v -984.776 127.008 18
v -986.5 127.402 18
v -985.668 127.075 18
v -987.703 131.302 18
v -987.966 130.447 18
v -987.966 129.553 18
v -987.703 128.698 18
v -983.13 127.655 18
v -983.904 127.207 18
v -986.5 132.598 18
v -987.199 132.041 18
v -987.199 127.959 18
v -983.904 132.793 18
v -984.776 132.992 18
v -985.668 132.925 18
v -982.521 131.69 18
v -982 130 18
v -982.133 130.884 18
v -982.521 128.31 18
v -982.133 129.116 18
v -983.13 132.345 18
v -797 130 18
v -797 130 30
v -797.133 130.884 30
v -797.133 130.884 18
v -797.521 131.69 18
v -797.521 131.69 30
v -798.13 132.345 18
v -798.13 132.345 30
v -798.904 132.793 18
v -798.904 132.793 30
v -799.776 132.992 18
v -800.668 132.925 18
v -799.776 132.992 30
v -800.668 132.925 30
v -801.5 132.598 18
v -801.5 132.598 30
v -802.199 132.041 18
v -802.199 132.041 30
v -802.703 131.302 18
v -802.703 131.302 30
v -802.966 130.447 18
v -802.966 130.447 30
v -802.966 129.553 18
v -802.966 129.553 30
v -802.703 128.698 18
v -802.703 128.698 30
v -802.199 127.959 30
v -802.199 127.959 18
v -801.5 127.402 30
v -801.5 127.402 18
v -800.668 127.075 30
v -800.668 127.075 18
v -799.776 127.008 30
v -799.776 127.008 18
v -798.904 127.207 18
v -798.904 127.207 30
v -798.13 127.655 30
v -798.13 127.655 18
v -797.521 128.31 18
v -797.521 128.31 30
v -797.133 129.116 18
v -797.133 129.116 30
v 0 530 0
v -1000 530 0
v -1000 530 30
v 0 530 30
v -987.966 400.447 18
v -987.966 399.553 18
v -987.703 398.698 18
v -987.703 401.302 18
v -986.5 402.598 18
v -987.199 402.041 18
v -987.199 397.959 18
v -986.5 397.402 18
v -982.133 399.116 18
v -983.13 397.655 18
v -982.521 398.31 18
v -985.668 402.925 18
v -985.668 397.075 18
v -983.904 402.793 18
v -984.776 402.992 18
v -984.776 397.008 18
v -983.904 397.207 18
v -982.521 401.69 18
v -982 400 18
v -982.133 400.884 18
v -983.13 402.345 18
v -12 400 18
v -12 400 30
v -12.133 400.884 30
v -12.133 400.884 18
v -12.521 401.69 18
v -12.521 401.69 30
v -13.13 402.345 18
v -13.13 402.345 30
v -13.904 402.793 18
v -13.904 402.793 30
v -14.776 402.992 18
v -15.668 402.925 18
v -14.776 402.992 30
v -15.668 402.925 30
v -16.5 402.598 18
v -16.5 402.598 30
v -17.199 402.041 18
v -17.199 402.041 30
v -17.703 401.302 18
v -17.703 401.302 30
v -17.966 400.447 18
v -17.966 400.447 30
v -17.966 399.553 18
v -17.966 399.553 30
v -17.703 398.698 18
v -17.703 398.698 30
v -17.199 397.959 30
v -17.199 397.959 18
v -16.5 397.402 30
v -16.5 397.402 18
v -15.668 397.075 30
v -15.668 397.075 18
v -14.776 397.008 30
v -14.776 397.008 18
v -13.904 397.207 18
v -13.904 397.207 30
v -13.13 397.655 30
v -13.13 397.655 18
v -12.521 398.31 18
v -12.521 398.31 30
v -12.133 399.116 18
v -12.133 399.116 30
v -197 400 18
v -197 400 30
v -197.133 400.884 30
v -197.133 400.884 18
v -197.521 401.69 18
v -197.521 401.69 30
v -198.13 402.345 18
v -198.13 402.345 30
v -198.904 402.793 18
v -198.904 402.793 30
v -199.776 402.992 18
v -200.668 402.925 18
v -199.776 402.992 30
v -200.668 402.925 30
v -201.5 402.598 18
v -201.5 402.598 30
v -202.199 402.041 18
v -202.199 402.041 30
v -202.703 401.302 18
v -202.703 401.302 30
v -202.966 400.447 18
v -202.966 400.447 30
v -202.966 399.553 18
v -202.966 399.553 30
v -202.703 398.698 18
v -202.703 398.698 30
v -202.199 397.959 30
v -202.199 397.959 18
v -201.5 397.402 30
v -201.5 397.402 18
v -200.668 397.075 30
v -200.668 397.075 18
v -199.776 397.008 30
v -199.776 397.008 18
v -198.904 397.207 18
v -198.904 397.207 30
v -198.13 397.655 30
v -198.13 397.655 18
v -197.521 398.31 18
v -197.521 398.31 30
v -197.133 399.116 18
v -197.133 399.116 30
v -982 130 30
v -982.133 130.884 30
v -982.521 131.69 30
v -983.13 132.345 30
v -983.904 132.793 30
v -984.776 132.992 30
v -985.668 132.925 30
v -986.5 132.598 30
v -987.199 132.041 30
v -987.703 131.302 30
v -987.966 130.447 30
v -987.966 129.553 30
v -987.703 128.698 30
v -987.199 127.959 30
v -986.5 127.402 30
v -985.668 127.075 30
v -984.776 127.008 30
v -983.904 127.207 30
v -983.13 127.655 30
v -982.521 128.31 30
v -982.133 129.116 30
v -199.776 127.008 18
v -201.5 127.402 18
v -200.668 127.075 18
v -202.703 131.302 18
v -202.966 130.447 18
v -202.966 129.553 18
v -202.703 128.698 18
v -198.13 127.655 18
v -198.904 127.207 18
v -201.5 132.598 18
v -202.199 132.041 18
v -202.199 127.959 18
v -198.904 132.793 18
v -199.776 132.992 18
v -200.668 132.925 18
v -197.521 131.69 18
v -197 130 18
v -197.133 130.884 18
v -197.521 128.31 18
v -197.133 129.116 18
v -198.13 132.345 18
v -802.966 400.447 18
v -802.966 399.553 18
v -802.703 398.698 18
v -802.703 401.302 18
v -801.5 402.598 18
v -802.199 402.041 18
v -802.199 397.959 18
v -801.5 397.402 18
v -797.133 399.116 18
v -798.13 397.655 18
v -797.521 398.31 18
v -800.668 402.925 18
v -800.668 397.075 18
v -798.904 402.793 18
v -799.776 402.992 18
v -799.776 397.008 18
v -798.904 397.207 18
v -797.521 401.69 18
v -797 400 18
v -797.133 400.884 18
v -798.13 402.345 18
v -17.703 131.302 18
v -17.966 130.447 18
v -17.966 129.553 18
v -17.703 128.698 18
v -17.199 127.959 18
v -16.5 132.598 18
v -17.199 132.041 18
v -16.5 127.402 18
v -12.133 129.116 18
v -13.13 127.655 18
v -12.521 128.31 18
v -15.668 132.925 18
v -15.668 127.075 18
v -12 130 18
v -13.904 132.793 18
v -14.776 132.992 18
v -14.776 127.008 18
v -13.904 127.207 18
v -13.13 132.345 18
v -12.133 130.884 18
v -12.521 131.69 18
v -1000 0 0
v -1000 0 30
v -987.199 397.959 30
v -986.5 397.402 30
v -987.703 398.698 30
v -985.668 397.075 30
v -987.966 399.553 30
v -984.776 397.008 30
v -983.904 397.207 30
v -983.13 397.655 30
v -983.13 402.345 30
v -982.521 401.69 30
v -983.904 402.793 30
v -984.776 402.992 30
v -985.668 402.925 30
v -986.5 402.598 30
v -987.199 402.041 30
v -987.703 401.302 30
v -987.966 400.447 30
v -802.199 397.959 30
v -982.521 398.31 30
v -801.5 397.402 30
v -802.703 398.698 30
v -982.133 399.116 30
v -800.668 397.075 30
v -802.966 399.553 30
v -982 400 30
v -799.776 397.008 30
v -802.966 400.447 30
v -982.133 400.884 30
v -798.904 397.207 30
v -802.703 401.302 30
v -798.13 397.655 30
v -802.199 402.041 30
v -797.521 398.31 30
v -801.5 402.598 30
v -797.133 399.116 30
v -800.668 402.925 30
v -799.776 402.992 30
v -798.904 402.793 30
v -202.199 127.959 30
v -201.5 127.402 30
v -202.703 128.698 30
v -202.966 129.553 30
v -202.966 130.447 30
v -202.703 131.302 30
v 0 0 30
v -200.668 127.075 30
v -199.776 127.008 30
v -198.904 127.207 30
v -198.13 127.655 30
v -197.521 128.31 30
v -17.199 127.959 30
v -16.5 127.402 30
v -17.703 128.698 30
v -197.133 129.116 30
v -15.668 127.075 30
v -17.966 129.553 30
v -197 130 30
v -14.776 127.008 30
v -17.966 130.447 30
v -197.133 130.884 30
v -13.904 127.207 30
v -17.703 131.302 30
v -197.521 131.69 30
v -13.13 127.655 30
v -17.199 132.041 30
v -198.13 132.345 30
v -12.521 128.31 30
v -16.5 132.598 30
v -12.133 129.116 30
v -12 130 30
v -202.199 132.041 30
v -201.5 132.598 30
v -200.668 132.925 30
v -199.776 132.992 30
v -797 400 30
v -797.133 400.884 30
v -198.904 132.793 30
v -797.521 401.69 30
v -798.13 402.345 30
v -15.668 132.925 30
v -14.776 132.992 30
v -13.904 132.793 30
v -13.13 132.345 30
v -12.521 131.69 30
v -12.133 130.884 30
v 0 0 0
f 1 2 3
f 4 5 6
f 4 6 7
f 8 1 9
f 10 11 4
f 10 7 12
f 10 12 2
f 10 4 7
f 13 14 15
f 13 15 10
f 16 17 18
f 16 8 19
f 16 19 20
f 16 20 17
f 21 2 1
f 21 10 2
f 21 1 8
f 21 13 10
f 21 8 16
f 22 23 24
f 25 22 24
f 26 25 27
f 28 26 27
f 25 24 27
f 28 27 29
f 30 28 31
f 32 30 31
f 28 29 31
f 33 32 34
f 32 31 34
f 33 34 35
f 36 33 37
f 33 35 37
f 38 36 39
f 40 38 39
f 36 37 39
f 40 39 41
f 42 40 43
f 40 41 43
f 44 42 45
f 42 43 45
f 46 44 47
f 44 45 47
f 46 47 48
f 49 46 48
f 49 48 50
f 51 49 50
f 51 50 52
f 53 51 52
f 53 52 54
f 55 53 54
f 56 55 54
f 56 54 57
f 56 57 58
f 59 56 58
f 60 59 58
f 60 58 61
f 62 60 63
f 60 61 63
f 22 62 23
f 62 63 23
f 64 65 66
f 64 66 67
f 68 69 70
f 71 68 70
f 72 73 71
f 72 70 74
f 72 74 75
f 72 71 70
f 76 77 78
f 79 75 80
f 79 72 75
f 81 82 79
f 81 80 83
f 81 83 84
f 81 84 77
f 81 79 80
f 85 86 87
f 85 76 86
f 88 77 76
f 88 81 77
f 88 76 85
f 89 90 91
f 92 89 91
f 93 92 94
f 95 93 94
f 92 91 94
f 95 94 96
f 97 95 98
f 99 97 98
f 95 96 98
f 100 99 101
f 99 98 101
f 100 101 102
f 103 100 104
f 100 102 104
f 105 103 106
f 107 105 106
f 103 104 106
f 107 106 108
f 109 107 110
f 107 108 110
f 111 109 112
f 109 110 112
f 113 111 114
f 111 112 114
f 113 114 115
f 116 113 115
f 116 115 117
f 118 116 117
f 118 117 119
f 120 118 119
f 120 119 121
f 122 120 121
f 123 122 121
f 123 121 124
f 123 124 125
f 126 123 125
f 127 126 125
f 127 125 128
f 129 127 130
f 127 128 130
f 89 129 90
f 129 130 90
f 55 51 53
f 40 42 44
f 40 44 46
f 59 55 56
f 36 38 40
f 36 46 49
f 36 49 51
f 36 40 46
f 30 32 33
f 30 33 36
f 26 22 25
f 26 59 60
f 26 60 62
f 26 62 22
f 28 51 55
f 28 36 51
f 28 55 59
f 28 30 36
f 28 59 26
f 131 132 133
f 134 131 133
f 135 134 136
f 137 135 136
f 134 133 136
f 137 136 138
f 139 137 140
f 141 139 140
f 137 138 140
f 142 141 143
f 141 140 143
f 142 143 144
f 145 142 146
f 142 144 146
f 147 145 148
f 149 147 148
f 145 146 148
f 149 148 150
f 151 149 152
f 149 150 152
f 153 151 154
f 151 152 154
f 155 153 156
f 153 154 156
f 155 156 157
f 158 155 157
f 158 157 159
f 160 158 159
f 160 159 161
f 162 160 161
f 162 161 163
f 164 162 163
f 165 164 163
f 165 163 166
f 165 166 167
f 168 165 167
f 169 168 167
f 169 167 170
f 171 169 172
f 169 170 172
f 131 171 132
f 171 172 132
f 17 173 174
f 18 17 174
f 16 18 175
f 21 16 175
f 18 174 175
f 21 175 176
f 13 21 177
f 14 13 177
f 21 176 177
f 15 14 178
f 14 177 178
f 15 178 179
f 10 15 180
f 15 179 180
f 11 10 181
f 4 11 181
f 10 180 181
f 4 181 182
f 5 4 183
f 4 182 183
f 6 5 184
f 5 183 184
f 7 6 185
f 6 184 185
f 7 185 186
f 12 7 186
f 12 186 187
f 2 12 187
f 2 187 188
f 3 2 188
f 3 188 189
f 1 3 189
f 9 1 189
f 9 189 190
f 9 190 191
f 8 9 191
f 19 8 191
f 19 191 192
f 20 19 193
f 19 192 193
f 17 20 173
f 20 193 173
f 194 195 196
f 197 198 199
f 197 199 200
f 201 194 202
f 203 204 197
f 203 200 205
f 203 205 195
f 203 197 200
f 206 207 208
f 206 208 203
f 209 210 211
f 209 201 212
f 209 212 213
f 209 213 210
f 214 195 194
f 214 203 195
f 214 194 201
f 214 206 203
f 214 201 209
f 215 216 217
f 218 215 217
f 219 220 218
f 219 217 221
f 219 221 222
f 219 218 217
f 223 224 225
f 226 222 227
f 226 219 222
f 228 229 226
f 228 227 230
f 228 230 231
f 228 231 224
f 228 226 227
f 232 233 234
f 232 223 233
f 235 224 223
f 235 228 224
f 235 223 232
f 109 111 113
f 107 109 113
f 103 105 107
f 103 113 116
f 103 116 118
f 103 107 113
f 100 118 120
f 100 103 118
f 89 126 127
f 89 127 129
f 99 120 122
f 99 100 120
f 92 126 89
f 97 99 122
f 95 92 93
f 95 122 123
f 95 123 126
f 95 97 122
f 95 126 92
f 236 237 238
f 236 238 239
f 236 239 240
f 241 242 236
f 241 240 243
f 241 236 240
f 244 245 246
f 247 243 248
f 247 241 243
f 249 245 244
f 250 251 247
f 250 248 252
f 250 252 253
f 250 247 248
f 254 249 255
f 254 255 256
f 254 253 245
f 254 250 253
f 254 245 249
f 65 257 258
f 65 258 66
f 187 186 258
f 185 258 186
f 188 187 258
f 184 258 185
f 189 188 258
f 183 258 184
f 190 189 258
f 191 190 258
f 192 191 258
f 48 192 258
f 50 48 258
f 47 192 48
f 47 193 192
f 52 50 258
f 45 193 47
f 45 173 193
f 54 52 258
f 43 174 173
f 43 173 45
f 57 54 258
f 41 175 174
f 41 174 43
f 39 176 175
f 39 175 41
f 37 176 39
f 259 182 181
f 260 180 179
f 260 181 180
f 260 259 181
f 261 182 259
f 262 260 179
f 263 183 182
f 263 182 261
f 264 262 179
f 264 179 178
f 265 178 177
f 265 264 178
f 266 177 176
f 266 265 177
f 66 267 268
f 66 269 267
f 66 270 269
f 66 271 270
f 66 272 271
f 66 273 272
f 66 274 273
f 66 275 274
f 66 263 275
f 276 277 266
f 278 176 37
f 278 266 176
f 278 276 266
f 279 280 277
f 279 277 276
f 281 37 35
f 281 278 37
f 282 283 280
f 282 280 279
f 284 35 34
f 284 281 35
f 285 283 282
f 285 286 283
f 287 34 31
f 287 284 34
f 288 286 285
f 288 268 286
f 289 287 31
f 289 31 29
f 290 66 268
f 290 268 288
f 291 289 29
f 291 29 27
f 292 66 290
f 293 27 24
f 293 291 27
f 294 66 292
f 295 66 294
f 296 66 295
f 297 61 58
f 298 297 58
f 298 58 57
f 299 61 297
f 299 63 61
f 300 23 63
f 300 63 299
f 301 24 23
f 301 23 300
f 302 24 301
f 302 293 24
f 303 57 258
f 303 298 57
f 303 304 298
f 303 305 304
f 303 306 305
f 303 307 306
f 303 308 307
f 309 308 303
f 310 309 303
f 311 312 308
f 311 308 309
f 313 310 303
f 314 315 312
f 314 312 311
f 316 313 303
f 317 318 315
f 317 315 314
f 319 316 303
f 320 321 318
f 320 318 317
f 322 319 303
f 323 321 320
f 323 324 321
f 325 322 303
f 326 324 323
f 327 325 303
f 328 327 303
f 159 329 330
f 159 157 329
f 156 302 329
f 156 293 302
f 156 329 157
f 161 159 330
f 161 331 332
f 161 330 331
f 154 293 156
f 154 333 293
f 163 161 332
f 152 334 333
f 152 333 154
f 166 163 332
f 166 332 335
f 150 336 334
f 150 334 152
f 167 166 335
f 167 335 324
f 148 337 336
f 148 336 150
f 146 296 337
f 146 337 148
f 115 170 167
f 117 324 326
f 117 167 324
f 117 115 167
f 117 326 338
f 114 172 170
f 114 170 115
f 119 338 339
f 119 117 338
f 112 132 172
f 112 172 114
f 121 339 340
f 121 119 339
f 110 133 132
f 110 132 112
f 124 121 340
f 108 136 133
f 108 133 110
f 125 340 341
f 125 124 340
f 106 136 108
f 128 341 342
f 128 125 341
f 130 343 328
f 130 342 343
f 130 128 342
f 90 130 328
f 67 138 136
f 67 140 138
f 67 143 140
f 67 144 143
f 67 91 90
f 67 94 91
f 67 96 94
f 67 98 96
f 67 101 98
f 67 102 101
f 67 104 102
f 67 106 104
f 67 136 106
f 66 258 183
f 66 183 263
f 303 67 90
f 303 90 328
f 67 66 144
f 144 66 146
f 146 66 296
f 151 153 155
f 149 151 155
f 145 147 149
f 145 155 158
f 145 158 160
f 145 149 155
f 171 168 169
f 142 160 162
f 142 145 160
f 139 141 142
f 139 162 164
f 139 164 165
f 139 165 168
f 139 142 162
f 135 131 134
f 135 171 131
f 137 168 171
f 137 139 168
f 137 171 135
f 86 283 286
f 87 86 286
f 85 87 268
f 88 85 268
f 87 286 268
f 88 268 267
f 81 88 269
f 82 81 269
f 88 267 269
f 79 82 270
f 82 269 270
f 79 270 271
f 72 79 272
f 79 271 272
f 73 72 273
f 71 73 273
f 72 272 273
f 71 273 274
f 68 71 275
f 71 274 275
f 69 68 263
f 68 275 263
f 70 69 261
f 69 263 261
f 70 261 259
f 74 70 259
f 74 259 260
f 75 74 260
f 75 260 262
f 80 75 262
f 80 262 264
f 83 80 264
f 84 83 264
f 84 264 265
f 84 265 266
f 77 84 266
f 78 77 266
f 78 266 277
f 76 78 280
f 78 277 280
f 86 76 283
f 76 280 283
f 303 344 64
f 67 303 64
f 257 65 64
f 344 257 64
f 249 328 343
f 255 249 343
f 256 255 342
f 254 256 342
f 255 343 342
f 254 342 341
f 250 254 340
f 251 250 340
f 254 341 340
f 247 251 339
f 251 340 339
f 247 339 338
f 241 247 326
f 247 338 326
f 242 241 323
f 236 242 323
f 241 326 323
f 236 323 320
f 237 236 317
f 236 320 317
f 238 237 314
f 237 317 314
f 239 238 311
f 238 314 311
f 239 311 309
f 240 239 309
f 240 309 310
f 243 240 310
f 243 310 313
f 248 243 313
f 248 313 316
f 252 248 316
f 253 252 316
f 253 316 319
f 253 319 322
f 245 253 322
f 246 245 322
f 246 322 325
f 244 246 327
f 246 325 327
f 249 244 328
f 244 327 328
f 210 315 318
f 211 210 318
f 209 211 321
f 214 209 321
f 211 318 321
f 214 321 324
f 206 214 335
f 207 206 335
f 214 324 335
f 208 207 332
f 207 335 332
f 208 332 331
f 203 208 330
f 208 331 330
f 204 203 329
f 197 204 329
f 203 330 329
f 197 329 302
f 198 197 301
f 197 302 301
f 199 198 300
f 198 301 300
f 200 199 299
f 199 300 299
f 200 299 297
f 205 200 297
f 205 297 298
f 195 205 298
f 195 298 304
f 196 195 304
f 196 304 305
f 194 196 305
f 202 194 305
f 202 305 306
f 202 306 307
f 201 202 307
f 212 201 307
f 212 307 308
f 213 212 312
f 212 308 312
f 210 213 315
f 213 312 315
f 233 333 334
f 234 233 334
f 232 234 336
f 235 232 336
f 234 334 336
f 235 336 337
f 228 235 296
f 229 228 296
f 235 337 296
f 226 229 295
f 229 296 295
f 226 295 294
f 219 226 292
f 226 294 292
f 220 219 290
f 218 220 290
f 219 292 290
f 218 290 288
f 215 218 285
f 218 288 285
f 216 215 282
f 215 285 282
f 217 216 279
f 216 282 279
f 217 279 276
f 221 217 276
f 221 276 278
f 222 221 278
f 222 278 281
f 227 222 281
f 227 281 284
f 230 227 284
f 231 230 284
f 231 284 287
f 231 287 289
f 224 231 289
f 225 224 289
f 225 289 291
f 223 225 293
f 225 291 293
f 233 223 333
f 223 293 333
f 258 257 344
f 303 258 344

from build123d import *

# Parameters (mm, degrees)
F0_W      = 1000
F0_H      = 530
F1_DEPTH  = 30
F2_R      = 3
F3_DEPTH  = 12
F4_R      = 3
F5_DEPTH  = 12
F6_R      = 3
F7_DEPTH  = 12
F9_R      = 3
F8_R      = 3
F10_DEPTH = 12
F11_R     = 3
F12_DEPTH = 12


with BuildPart() as f1:
    # F0 (on Top) → F1 (new body)
    with BuildSketch(Plane.XY):
        with Locations((-500, 265)):
            Rectangle(F0_W, F0_H)
    extrude(amount=F1_DEPTH)

    # F2 (on face) → F3 (cut)
    with BuildSketch(Plane.XY.offset(30)):
        with Locations((-200, 130)):
            Circle(F2_R)
    extrude(amount=-F3_DEPTH, mode=Mode.SUBTRACT)

    # F4 (on face) → F5 (cut)
    with BuildSketch(Plane.XY.offset(30)):
        with Locations((-800, 130)):
            Circle(F4_R)
    extrude(amount=-F5_DEPTH, mode=Mode.SUBTRACT)

    # F6 (on face) → F7 (cut)
    with BuildSketch(Plane.XY.offset(30)):
        with Locations((-200, 400)):
            Circle(F6_R)
        with Locations((-800, 400)):
            Circle(F6_R)
    extrude(amount=-F7_DEPTH, mode=Mode.SUBTRACT)

    # F9 (on face) + F8 (on face) → F10 (cut)
    with BuildSketch(Plane.XY.offset(30)):
        with Locations((-985, 130)):
            Circle(F9_R)
    with BuildSketch(Plane.XY.offset(30)):
        with Locations((-985, 400)):
            Circle(F8_R)
    extrude(amount=-F10_DEPTH, mode=Mode.SUBTRACT)

    # F11 (on face) → F12 (cut)
    with BuildSketch(Plane.XY.offset(30)):
        with Locations((-15, 400)):
            Circle(F11_R)
        with Locations((-15, 130)):
            Circle(F11_R)
    extrude(amount=-F12_DEPTH, mode=Mode.SUBTRACT)


solid = f1.part
